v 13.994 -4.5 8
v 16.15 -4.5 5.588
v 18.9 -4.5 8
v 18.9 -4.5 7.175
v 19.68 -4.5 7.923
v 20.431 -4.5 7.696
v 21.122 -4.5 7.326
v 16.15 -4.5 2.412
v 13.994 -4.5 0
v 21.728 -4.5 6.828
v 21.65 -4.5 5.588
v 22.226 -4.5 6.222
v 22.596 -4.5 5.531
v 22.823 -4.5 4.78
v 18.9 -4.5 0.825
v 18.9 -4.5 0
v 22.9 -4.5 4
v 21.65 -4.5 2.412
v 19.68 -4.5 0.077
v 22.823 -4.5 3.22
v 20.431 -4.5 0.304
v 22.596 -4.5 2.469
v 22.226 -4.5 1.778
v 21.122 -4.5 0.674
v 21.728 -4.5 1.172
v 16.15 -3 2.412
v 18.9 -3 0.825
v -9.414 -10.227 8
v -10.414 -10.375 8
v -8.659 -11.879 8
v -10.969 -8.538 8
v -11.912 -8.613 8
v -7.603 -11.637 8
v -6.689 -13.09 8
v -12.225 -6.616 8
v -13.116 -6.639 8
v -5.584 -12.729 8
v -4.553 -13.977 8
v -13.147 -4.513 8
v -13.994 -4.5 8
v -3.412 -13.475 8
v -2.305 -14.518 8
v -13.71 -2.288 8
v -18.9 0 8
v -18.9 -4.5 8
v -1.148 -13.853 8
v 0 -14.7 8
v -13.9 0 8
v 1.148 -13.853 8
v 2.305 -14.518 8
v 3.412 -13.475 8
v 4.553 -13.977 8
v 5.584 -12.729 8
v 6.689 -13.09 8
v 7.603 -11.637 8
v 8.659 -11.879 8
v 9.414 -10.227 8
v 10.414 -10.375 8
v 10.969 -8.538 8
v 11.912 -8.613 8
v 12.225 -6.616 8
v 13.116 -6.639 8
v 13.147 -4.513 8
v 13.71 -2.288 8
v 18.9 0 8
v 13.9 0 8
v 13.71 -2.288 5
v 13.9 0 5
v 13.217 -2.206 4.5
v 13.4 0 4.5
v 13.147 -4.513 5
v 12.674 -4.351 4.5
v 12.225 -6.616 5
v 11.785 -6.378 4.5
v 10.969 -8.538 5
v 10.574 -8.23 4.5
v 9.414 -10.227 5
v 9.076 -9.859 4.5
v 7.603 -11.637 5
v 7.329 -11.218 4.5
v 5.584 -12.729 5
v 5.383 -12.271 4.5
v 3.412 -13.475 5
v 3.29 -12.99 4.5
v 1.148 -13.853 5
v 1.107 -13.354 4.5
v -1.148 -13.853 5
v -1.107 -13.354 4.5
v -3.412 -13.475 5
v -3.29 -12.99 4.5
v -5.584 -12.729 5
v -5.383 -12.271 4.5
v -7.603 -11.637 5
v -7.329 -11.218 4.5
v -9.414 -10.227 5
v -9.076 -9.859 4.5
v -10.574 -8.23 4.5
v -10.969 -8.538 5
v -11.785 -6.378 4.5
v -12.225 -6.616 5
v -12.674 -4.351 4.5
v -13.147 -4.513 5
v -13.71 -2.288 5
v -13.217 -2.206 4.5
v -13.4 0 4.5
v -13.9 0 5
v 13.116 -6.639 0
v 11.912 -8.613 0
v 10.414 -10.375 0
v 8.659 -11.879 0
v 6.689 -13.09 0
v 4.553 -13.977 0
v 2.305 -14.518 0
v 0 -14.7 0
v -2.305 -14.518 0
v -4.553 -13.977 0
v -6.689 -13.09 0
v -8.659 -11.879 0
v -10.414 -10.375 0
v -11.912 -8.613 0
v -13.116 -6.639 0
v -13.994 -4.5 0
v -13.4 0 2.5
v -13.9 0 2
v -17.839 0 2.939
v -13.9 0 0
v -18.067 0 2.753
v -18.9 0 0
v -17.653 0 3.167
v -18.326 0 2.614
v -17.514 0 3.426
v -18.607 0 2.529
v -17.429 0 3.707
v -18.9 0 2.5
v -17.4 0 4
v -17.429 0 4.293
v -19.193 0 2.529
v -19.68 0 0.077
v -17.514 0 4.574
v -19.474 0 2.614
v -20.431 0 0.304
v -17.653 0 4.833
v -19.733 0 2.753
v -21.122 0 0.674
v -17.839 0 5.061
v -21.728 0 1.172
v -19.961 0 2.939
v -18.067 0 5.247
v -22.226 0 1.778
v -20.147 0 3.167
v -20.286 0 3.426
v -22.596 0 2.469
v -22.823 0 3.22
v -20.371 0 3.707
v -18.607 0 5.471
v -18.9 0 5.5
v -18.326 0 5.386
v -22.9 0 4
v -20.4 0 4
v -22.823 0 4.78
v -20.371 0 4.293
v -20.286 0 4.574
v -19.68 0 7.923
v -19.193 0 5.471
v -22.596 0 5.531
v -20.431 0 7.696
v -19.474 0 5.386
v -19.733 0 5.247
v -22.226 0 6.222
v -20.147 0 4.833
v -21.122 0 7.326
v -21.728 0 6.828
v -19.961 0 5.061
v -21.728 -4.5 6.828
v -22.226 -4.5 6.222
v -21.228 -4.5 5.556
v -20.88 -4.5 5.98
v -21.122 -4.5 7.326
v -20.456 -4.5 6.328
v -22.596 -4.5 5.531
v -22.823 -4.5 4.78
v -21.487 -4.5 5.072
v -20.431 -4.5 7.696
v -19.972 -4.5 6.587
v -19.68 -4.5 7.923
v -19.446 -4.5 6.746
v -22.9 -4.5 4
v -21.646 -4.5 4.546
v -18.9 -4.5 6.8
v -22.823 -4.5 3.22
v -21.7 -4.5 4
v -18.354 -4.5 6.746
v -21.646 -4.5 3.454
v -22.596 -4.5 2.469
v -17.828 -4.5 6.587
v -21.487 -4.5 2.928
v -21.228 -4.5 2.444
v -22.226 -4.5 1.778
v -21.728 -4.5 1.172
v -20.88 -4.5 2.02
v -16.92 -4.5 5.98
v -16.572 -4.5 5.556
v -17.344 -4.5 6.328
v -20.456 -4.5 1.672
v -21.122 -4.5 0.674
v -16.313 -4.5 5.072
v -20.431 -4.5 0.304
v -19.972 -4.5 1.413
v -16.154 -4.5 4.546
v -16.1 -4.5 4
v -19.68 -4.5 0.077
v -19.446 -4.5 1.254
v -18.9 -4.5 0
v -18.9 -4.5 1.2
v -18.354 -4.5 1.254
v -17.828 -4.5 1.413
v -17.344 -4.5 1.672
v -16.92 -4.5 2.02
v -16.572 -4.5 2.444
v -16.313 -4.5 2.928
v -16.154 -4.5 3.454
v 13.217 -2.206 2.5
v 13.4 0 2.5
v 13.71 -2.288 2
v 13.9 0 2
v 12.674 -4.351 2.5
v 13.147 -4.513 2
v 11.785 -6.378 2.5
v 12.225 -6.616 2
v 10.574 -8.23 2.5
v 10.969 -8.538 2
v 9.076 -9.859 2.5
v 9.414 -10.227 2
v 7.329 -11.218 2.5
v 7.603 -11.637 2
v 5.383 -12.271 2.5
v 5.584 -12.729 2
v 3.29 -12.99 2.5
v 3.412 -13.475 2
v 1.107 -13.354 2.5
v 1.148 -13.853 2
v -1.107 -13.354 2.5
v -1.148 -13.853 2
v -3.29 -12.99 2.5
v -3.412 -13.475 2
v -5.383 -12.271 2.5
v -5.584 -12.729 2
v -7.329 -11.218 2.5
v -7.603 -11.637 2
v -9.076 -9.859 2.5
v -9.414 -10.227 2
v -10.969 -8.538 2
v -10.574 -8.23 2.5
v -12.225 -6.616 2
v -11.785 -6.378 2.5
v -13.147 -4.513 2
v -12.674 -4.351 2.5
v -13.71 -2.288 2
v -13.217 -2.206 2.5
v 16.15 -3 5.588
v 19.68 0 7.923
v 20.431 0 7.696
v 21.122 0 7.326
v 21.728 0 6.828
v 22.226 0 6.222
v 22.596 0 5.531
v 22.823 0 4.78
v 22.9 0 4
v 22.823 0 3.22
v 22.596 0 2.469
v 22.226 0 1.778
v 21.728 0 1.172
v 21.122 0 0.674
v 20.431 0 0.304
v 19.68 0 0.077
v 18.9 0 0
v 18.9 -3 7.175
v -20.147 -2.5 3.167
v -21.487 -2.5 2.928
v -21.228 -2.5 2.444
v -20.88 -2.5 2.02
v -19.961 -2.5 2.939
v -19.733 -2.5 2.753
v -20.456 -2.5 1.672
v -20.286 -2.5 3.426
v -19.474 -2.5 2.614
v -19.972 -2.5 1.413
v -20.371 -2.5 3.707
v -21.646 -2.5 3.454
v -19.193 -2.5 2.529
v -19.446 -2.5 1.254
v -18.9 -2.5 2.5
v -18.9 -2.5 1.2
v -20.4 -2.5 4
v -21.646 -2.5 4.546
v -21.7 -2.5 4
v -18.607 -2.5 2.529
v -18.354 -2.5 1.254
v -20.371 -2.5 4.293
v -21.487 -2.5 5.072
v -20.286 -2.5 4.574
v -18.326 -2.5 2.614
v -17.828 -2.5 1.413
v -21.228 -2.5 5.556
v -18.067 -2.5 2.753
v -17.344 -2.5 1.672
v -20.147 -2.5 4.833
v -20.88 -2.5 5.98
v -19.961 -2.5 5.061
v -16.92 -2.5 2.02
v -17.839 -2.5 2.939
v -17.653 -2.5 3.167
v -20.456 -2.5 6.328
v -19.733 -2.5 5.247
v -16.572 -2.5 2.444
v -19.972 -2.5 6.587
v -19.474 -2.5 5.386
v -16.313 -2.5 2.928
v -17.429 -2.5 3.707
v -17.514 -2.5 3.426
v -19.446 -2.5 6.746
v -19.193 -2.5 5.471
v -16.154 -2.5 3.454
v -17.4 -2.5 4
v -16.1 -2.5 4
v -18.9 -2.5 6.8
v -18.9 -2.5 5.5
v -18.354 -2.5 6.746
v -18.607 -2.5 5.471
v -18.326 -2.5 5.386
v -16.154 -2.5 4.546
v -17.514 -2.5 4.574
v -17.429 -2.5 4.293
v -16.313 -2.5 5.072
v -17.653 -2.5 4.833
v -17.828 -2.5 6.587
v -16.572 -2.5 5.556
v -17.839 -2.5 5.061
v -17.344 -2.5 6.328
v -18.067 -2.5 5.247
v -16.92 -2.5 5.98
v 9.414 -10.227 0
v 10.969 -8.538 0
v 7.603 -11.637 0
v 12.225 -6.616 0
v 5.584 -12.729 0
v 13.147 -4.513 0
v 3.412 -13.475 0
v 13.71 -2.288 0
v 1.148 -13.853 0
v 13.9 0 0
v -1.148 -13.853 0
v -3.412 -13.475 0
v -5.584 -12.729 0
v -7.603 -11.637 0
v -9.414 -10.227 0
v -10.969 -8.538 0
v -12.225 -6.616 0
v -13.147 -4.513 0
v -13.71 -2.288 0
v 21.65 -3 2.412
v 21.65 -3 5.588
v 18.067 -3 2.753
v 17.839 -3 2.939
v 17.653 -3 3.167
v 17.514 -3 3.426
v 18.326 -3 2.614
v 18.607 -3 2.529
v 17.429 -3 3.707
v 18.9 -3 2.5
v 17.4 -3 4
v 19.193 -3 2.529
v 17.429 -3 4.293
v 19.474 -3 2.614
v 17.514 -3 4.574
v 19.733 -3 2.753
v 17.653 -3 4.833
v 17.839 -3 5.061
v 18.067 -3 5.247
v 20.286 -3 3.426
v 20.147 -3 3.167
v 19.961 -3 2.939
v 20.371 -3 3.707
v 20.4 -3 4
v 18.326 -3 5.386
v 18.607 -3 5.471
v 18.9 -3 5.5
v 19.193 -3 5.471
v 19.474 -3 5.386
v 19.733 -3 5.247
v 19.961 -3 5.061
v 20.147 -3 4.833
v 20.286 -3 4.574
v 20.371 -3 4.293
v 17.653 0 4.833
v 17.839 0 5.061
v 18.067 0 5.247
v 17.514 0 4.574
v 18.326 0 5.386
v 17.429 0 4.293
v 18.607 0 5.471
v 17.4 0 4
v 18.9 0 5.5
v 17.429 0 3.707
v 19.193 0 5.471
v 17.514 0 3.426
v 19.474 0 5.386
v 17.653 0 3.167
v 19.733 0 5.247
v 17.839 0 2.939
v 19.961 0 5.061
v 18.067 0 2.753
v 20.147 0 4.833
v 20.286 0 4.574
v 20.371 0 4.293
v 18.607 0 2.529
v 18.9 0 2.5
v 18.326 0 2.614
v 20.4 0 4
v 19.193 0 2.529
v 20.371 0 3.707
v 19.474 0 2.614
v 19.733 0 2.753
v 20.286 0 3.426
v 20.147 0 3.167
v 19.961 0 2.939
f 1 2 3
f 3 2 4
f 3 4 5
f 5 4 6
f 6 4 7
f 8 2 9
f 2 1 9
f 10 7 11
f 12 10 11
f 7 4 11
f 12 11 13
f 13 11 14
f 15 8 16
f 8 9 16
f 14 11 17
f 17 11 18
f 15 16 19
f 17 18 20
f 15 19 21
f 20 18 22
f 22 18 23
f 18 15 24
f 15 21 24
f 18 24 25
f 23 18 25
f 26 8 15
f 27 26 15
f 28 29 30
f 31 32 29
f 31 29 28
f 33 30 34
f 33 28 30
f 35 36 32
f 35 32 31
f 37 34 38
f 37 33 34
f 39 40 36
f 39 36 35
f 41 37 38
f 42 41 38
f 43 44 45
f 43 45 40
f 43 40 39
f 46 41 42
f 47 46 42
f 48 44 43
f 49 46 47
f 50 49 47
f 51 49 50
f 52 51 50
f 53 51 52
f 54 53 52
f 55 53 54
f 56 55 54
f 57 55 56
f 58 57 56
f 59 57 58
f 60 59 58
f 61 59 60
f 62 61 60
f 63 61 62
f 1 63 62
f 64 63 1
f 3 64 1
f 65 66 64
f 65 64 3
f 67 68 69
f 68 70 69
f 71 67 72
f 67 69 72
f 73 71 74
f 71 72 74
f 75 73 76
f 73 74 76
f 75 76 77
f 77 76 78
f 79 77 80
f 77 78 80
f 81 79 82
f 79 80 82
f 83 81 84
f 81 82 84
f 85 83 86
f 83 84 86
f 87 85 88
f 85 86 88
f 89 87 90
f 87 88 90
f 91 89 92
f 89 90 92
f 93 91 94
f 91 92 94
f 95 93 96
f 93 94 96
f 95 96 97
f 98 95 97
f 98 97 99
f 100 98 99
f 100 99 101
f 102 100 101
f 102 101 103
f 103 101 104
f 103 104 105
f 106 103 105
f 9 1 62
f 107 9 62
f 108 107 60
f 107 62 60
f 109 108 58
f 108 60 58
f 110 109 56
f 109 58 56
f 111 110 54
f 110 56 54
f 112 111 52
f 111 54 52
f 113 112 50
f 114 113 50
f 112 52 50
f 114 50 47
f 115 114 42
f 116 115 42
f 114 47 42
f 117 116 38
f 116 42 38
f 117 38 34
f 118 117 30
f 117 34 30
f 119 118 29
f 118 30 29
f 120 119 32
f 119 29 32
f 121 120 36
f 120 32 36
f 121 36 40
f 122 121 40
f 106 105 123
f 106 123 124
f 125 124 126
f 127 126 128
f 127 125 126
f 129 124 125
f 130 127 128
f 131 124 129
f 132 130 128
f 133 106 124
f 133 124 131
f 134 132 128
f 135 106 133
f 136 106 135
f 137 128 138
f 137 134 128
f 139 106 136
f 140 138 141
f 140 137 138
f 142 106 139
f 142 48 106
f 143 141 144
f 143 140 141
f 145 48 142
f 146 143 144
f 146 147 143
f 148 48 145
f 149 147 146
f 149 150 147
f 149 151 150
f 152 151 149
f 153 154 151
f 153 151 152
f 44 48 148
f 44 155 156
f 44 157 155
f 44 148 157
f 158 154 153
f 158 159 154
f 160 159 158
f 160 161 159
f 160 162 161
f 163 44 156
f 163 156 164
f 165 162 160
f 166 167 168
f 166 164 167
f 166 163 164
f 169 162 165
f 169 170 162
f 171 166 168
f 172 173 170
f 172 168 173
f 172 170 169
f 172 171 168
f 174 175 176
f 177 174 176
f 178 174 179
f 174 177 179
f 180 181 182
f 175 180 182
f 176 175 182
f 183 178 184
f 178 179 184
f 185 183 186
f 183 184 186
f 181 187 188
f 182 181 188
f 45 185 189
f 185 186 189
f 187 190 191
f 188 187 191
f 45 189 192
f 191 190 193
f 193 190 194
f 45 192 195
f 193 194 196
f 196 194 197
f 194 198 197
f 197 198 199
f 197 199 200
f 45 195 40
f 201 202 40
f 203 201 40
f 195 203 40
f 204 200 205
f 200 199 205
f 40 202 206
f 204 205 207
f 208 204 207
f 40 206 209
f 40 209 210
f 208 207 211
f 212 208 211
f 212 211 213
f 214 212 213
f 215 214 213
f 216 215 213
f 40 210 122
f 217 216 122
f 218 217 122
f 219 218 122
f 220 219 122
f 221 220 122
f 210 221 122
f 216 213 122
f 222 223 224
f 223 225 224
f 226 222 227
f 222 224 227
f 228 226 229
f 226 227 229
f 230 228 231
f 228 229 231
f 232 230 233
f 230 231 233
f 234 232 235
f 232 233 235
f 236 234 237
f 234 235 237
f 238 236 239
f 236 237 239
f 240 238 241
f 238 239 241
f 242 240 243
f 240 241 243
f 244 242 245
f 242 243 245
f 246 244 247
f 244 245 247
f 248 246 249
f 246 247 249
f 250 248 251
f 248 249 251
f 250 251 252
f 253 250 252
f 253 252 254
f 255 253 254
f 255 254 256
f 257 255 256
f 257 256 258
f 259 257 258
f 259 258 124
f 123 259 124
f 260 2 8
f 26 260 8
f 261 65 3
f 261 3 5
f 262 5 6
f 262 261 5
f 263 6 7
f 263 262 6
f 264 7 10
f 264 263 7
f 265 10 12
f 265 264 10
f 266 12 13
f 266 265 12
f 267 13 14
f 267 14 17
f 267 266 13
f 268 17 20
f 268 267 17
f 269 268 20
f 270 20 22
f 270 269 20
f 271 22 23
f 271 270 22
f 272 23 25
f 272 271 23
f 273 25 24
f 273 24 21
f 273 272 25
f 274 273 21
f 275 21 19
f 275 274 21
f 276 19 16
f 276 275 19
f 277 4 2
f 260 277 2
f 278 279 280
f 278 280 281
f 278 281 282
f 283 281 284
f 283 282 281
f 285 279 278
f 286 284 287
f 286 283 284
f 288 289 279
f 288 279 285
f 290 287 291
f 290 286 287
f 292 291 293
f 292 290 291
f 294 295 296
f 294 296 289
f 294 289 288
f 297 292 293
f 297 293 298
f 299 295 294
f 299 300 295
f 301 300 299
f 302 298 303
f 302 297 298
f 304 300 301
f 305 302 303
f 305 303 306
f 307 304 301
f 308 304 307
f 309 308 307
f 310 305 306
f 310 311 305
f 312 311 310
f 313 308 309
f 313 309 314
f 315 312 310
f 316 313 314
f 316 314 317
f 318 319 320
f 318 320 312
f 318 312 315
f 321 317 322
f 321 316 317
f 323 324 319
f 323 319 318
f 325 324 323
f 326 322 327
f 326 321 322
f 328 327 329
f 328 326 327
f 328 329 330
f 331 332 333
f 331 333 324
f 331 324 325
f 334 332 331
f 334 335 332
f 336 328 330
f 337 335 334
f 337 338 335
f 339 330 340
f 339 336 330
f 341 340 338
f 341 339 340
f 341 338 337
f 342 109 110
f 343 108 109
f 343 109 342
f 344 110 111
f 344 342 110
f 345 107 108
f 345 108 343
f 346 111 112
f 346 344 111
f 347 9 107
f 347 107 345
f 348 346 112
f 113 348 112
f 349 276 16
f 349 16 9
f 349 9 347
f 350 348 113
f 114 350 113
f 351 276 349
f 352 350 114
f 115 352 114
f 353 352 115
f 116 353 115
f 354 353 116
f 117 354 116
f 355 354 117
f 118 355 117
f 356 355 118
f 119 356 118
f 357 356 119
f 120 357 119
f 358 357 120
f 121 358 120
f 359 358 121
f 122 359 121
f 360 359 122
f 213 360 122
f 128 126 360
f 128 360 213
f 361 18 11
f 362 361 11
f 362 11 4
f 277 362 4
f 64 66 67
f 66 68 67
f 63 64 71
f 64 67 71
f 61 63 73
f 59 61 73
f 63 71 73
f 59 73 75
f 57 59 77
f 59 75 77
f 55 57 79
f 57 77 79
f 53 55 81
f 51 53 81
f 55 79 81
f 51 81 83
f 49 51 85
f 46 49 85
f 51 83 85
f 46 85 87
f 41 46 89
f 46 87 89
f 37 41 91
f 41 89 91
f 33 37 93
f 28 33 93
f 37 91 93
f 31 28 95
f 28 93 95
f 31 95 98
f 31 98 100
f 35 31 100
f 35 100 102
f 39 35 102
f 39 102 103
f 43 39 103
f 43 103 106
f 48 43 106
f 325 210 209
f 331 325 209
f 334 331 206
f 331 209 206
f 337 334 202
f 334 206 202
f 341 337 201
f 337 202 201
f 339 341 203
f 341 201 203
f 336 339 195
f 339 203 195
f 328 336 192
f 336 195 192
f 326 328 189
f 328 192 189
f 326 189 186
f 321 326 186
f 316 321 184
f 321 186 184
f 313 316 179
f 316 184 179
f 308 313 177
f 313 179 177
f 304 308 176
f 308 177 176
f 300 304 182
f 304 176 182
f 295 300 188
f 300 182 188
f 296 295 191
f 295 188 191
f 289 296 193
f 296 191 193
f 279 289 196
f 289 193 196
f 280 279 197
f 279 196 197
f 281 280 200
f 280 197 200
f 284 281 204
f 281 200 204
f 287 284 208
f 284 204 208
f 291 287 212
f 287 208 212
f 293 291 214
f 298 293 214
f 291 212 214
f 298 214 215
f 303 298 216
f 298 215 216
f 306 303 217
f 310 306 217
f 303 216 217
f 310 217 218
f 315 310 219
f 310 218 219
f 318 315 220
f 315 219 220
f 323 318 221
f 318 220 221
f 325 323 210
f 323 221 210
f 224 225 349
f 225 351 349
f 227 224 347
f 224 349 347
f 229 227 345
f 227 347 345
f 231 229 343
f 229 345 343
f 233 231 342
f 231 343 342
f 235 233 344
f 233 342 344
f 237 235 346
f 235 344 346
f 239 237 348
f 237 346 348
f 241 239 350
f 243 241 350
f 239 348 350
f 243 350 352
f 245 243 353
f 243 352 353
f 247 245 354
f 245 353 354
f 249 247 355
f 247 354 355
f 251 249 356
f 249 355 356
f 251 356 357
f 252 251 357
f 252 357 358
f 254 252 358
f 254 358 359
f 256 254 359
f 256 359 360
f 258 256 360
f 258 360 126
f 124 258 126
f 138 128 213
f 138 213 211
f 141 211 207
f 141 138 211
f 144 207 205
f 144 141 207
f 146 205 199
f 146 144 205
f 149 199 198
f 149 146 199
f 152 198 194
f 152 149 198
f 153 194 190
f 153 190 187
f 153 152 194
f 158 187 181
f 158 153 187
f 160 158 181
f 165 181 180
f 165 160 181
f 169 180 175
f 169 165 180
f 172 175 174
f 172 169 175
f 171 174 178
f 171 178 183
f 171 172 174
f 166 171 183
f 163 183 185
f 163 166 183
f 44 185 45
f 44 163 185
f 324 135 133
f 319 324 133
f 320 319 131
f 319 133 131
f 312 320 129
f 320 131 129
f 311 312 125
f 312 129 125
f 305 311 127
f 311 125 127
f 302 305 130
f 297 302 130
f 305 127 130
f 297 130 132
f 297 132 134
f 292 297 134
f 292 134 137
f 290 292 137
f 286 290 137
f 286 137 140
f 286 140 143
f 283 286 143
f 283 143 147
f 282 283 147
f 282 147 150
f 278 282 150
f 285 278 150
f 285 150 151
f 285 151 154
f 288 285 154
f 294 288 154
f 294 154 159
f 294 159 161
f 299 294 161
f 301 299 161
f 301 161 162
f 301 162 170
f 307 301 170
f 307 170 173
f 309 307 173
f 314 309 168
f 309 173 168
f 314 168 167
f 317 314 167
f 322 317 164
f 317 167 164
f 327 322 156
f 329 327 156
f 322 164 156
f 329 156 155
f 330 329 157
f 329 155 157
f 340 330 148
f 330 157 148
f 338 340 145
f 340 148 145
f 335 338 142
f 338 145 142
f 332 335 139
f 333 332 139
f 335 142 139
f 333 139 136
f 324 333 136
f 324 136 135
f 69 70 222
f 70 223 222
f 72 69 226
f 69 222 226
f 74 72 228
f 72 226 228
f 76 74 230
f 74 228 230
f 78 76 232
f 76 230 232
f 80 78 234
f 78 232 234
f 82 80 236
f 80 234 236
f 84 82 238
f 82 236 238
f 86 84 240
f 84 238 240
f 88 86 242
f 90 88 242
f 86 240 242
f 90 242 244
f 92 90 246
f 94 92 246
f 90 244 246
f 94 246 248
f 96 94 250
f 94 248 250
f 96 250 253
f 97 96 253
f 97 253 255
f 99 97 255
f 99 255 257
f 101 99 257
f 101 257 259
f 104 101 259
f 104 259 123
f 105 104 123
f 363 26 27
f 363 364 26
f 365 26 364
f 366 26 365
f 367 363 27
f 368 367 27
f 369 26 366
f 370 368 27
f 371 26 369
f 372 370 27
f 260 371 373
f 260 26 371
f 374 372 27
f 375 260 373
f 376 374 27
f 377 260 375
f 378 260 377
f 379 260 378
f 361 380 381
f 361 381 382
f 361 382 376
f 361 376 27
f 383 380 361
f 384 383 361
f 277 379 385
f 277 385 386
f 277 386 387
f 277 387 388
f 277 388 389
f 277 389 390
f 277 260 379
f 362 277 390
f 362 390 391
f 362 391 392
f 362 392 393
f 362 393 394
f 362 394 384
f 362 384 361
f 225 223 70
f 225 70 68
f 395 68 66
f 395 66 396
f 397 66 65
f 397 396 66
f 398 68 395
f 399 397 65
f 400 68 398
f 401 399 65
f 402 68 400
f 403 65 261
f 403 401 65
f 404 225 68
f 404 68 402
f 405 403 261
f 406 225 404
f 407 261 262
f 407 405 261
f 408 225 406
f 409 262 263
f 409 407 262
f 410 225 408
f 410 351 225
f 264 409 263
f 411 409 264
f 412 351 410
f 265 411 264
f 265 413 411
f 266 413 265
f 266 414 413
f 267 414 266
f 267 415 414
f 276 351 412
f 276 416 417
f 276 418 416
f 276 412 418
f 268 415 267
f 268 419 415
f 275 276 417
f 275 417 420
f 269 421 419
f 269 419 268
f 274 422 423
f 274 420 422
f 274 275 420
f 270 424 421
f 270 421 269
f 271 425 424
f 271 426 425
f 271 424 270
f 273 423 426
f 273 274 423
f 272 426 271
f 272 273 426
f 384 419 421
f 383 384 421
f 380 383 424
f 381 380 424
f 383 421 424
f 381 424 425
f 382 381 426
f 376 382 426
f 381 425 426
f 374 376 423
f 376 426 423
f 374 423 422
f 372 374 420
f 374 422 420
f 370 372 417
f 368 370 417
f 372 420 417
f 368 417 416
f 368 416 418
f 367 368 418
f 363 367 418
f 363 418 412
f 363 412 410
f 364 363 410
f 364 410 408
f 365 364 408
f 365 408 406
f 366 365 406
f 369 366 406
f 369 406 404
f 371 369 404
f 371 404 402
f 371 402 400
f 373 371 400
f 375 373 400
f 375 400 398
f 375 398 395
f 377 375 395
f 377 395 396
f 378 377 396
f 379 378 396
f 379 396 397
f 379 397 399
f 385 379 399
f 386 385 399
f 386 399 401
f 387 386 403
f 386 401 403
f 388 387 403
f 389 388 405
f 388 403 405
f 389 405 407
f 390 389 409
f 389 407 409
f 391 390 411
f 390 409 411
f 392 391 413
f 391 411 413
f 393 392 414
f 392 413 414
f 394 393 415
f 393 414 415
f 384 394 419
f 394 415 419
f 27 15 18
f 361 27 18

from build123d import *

# Parameters (mm, degrees)
REVOLUTION_ANGLE = -180
SKETCH001_R      = 1.5
PAD_DEPTH        = 4.5
POCKET_DEPTH     = 2
SKETCH003_R      = 2.8
POCKET001_DEPTH  = 2


with BuildPart() as part:
    # Sketch → Revolution (revolve)
    with BuildSketch(Plane.XZ):
        Polygon((13.4, 4.5), (13.4, 2.5), (13.9, 2), (13.9, 0), (14.7, 0), (14.7, 8), (13.9, 8), (13.9, 5), align=None)
    revolve(axis=Axis((0, 0, 0), (0, 0, 1)), revolution_arc=REVOLUTION_ANGLE)

    # Sketch001 (on Face10 of Revolution) → Pad (new body)
    with BuildSketch(Plane(origin=(0, 0, 0), x_dir=(1, 0, 0), z_dir=(0, 1, 0))):
        with BuildLine():
            ThreePointArc((18.9, -8), (22.9, -4), (18.9, 0))
            Line((18.9, 0), (13.9, 0))
            Line((13.9, 0), (13.9, -8))
            Line((13.9, -8), (18.9, -8))
        make_face()
        with Locations((18.9, -4)):
            Circle(SKETCH001_R, mode=Mode.SUBTRACT)
        with BuildLine():
            ThreePointArc((-18.9, 0), (-22.9, -4), (-18.9, -8))
            Line((-18.9, -8), (-13.9, -8))
            Line((-13.9, -8), (-13.9, 0))
            Line((-13.9, 0), (-18.9, 0))
        make_face()
        with Locations((-18.9, -4)):
            Circle(SKETCH001_R, mode=Mode.SUBTRACT)
    extrude(amount=-PAD_DEPTH)

    # Sketch002 → Pocket (cut)
    with BuildSketch(Plane.XZ.offset(5)):
        Polygon((21.65, 2.412287), (21.65, 5.587713), (18.9, 7.175426), (16.15, 5.587713), (16.15, 2.412287), (18.9, 0.824574), align=None)
    extrude(amount=-POCKET_DEPTH, mode=Mode.SUBTRACT)

    # Sketch003 (on Face28 of Pocket) → Pocket001 (cut)
    with BuildSketch(Plane.XZ.offset(4.5)):
        with Locations((-18.9, 4)):
            Circle(SKETCH003_R)
    extrude(amount=-POCKET001_DEPTH, mode=Mode.SUBTRACT)


solid = part.part
